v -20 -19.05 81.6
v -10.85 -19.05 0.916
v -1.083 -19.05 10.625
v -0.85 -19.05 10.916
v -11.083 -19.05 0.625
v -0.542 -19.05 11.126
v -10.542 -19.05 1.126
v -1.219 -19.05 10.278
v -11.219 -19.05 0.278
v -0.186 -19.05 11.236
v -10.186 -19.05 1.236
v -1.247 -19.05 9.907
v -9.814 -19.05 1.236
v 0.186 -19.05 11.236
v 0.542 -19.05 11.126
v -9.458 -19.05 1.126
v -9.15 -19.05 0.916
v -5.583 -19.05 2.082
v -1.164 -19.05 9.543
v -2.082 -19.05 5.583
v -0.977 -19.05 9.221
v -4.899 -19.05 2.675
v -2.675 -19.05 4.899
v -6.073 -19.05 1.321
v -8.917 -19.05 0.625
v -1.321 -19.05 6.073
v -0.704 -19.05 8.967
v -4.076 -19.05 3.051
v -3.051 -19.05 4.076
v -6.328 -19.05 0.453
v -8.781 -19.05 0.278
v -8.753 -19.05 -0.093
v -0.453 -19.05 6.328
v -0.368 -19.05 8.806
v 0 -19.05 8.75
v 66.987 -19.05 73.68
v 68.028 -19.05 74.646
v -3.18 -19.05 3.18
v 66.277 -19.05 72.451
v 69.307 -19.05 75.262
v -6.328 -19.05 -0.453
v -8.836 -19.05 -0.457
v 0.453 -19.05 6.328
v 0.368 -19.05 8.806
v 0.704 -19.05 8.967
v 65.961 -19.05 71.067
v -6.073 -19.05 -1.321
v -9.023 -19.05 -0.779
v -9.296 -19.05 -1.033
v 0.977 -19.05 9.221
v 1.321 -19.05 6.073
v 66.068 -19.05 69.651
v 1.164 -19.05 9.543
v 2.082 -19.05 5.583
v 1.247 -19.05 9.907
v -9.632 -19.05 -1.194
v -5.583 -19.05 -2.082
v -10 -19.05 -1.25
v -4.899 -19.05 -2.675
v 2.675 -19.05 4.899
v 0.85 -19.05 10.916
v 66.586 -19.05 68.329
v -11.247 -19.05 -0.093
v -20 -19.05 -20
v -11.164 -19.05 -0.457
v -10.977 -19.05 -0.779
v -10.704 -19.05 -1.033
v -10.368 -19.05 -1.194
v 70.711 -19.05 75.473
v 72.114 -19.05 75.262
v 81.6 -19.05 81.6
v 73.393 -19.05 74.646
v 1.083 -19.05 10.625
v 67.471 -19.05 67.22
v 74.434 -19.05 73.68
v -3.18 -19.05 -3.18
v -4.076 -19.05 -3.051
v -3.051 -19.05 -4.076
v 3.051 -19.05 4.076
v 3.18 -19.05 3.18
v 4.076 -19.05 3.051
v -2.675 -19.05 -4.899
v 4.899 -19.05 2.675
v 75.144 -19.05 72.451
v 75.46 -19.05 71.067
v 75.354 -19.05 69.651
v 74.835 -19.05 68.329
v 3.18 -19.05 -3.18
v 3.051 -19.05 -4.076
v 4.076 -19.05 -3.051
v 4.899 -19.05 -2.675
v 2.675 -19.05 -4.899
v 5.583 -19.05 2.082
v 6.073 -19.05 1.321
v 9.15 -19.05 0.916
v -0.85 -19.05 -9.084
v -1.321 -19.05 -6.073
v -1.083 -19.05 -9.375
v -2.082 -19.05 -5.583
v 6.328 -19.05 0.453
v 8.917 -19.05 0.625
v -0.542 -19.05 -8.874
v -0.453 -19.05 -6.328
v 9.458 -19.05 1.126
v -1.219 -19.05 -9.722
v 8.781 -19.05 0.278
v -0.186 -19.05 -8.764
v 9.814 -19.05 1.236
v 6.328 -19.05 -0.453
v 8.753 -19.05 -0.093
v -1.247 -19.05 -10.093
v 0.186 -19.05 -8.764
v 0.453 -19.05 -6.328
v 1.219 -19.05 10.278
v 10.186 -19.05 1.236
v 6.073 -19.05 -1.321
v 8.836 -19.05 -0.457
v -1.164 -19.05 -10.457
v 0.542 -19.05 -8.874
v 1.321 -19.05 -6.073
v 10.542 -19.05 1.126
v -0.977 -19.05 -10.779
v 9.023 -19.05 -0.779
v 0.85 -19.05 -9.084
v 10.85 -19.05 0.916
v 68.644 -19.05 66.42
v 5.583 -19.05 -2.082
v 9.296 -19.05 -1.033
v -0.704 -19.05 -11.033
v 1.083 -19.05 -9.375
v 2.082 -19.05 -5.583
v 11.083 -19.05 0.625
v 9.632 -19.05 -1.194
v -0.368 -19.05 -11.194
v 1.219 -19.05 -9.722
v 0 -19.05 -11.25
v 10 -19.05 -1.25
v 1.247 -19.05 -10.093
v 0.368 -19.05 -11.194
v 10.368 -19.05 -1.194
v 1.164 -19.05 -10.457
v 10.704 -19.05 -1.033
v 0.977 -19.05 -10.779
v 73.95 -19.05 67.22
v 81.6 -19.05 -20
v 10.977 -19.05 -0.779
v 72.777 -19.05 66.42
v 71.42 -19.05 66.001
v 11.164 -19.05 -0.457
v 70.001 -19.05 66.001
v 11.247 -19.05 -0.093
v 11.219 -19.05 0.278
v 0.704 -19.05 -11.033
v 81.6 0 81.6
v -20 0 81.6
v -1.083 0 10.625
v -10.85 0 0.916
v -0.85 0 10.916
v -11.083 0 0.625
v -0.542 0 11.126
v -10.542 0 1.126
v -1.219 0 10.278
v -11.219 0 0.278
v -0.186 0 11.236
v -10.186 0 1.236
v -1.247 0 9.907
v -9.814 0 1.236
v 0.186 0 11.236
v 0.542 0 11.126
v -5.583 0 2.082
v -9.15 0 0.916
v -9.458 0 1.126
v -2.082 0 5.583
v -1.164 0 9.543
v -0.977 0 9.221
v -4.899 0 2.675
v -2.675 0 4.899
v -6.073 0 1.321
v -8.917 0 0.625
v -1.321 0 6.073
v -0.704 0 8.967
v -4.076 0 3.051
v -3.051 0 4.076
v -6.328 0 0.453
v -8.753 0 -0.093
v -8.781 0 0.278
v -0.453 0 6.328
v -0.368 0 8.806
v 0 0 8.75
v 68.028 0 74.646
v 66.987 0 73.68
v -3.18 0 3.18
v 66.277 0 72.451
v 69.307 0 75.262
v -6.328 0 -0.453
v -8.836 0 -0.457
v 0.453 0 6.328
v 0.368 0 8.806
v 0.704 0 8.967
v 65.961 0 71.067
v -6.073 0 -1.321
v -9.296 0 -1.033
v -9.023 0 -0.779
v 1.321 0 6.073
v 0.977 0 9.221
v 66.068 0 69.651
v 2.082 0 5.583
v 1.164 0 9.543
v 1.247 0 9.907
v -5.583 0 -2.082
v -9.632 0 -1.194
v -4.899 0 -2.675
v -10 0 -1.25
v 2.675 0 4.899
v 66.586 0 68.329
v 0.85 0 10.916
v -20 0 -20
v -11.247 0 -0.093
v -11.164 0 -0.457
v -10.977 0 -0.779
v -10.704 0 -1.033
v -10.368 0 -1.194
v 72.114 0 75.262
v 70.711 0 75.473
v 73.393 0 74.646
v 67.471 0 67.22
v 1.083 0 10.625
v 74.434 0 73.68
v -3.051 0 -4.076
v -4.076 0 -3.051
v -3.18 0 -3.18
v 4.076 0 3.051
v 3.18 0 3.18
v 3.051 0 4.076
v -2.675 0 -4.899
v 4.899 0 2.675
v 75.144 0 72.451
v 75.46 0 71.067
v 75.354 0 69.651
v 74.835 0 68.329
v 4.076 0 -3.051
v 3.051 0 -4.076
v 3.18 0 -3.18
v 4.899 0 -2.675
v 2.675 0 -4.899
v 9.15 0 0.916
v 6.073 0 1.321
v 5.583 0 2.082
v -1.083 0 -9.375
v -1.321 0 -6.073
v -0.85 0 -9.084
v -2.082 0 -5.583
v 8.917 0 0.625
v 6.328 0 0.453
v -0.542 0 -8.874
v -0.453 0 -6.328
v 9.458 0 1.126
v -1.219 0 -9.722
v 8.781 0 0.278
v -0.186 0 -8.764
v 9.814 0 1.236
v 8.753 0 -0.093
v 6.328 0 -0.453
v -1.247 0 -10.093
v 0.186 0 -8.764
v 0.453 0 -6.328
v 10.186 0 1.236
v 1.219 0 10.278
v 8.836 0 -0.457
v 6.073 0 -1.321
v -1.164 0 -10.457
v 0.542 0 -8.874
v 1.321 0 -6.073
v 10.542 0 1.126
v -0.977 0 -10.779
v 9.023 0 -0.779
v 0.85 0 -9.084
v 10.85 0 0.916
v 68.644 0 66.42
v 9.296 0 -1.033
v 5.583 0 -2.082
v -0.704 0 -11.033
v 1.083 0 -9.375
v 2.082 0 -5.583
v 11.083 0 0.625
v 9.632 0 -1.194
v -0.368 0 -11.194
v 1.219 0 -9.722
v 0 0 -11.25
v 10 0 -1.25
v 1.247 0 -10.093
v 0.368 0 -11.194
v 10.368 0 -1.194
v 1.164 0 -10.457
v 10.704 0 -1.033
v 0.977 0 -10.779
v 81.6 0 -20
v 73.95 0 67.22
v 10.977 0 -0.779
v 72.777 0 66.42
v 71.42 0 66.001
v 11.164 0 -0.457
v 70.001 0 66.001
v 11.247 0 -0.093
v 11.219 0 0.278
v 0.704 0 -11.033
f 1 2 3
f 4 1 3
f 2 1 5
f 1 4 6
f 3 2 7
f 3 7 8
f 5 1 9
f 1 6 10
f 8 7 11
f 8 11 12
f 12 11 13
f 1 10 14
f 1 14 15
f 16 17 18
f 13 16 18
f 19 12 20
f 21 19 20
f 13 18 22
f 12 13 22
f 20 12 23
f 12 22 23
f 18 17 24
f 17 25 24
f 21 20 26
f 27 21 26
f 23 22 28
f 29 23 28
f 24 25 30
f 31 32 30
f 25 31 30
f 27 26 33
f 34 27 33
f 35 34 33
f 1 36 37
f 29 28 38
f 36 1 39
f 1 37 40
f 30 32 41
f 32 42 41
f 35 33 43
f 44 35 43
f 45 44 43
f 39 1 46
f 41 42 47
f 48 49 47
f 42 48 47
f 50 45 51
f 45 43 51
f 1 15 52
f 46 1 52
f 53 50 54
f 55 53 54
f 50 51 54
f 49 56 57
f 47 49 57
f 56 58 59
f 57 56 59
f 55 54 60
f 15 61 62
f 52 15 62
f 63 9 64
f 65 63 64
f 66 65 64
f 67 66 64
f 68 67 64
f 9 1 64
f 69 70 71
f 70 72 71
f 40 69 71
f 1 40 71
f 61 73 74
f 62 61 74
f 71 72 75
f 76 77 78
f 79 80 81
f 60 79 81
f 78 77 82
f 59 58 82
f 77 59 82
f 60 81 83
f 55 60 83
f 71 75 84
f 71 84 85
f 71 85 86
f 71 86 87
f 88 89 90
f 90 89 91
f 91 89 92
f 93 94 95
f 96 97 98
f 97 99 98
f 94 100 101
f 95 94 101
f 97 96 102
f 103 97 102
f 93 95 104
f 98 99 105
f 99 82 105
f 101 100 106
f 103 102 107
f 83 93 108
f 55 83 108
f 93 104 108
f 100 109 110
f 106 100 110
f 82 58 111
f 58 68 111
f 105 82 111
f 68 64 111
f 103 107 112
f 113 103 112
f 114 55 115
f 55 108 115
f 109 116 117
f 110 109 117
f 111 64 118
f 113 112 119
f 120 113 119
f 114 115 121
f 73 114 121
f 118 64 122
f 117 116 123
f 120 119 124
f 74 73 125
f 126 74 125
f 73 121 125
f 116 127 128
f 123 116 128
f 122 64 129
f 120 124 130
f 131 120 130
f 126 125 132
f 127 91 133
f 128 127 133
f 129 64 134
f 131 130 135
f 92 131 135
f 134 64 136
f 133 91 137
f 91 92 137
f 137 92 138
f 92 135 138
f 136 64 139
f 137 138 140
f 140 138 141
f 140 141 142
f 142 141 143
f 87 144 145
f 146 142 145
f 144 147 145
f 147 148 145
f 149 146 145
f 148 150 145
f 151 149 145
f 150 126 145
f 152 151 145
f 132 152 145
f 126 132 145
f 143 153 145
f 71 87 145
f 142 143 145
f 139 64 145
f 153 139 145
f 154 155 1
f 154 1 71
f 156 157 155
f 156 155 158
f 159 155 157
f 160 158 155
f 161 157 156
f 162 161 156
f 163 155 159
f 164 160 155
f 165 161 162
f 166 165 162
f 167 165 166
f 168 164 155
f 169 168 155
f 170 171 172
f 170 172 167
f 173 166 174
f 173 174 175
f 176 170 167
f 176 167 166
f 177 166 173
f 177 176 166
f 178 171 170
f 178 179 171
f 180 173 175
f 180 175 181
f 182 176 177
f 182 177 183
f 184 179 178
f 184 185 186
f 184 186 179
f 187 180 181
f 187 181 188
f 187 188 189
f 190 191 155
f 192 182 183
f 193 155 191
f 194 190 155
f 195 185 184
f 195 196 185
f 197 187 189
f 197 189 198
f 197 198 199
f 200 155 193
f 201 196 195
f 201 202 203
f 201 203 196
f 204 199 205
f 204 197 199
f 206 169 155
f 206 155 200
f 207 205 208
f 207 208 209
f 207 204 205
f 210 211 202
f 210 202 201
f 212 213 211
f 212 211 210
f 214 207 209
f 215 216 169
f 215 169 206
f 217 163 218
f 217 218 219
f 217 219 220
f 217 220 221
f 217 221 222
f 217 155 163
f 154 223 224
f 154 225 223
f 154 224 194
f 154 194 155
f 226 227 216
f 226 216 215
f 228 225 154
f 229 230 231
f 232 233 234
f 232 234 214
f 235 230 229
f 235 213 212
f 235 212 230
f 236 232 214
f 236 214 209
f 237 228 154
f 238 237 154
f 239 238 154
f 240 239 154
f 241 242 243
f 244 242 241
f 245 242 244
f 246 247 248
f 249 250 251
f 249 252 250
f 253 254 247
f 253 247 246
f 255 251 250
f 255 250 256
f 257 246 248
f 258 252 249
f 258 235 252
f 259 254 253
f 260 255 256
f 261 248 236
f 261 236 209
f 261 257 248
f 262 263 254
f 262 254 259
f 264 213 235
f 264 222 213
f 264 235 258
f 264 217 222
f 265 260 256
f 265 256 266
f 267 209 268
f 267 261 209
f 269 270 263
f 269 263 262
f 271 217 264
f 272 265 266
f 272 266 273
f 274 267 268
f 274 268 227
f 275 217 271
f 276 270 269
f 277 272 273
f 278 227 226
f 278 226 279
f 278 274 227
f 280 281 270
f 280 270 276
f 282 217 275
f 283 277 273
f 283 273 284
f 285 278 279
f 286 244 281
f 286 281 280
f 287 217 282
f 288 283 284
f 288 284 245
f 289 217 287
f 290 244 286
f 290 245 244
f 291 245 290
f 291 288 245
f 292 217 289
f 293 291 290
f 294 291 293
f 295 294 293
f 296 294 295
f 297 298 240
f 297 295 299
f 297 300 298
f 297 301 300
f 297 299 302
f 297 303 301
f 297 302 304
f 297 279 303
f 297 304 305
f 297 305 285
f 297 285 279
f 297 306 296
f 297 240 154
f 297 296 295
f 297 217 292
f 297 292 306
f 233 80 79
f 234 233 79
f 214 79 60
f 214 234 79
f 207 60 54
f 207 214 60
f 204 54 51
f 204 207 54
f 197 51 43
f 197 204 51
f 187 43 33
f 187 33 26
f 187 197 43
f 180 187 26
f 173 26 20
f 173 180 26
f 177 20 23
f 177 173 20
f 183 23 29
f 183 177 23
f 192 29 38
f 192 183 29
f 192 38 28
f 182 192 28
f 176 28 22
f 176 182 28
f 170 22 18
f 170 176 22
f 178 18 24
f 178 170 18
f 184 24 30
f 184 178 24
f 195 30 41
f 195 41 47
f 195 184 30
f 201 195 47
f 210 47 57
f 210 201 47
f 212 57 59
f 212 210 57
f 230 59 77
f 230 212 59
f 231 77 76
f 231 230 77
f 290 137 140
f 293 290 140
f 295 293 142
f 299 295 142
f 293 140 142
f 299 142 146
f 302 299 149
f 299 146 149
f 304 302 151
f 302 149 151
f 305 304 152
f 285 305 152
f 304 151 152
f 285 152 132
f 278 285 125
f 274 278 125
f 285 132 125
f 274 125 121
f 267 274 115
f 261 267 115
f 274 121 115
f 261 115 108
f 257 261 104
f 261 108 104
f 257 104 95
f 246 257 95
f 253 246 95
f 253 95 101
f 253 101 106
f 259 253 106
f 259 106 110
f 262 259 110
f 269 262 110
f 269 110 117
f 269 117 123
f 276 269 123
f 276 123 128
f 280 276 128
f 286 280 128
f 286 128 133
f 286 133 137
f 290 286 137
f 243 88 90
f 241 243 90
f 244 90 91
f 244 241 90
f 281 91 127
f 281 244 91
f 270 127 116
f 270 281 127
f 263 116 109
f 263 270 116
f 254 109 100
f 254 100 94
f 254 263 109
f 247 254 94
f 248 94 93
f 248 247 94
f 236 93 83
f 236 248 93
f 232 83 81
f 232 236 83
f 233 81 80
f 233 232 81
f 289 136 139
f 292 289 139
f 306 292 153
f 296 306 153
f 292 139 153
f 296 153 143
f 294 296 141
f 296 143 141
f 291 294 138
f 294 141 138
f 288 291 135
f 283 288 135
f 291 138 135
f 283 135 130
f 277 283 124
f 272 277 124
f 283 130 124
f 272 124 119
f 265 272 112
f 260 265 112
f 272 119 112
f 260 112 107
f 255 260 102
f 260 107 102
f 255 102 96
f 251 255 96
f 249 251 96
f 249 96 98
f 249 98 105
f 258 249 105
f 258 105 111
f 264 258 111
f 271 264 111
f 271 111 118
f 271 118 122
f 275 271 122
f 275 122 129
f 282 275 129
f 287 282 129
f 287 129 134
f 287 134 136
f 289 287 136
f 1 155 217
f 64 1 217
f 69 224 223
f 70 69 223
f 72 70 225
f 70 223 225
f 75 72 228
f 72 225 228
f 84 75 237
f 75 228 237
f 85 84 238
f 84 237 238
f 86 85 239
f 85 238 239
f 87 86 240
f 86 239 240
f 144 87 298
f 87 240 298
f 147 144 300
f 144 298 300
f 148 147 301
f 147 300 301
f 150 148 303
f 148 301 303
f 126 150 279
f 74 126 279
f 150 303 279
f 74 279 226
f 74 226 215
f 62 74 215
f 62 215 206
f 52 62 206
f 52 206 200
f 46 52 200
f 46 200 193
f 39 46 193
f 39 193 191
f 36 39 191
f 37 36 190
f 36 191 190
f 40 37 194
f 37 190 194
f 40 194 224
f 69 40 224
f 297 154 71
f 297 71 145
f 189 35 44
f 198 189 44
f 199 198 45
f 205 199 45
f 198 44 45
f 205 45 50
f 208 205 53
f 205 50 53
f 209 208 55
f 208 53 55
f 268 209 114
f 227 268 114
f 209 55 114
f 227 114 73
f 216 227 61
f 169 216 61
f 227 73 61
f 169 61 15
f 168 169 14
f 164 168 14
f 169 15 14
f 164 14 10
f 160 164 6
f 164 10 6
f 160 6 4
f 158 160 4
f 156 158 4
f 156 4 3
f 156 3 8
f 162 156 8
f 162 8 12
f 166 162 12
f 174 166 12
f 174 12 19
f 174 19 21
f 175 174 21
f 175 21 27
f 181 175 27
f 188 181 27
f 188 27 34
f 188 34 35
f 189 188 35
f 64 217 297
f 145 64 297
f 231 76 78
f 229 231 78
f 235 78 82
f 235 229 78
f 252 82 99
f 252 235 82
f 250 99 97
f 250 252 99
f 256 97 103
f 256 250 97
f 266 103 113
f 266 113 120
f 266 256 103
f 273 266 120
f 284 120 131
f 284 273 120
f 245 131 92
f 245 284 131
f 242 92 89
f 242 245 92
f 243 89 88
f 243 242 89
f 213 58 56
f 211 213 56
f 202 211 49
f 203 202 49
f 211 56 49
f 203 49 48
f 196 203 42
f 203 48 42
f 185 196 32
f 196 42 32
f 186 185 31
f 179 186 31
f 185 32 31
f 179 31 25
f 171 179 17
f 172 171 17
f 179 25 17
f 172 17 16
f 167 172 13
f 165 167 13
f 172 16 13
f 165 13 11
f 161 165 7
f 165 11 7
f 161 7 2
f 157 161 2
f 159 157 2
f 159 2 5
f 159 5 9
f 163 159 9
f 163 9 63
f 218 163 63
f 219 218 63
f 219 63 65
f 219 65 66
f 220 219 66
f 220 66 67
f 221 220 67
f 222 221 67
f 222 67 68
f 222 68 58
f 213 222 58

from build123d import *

# Parameters (mm, degrees)
SKETCH2_W                   = 101.6
SKETCH2_H                   = 101.6
SKETCH2_R                   = 4.7625
BOSS_EXTRUDE1_DEPTH         = 19.05
TAP_DRILL_FOR_M3X0_5_TAP1_D = 2.5


with BuildPart() as part:
    # Sketch2 → Boss-Extrude1 (new body)
    with BuildSketch(Plane(origin=(0, 0, 0), x_dir=(1, 0, 0), z_dir=(0, 1, 0))):
        with Locations((30.8, -30.8)):
            Rectangle(SKETCH2_W, SKETCH2_H)
        with Locations(Location((70.710678119, -70.710678119, 0), (0, 0, 270))):
            Circle(SKETCH2_R, mode=Mode.SUBTRACT)
        with BuildLine():
            ThreePointArc((-3.18, -3.18), (-6.36, 0), (-3.18, 3.18))
            ThreePointArc((-3.18, 3.18), (0, 6.36), (3.18, 3.18))
            ThreePointArc((3.18, 3.18), (6.36, 0), (3.18, -3.18))
            ThreePointArc((3.18, -3.18), (0, -6.36), (-3.18, -3.18))
        make_face(mode=Mode.SUBTRACT)
    extrude(amount=-BOSS_EXTRUDE1_DEPTH)

    # Tap Drill for M3x0.5 Tap1 (through all)
    with Locations(Plane(origin=(0, 0, -10), x_dir=(0, 0, 1), z_dir=(0, 1, 0))):
        with Locations((0, 0), (10, 10), (20, 0), (10, -10)):
            Hole(TAP_DRILL_FOR_M3X0_5_TAP1_D / 2)


solid = part.part
